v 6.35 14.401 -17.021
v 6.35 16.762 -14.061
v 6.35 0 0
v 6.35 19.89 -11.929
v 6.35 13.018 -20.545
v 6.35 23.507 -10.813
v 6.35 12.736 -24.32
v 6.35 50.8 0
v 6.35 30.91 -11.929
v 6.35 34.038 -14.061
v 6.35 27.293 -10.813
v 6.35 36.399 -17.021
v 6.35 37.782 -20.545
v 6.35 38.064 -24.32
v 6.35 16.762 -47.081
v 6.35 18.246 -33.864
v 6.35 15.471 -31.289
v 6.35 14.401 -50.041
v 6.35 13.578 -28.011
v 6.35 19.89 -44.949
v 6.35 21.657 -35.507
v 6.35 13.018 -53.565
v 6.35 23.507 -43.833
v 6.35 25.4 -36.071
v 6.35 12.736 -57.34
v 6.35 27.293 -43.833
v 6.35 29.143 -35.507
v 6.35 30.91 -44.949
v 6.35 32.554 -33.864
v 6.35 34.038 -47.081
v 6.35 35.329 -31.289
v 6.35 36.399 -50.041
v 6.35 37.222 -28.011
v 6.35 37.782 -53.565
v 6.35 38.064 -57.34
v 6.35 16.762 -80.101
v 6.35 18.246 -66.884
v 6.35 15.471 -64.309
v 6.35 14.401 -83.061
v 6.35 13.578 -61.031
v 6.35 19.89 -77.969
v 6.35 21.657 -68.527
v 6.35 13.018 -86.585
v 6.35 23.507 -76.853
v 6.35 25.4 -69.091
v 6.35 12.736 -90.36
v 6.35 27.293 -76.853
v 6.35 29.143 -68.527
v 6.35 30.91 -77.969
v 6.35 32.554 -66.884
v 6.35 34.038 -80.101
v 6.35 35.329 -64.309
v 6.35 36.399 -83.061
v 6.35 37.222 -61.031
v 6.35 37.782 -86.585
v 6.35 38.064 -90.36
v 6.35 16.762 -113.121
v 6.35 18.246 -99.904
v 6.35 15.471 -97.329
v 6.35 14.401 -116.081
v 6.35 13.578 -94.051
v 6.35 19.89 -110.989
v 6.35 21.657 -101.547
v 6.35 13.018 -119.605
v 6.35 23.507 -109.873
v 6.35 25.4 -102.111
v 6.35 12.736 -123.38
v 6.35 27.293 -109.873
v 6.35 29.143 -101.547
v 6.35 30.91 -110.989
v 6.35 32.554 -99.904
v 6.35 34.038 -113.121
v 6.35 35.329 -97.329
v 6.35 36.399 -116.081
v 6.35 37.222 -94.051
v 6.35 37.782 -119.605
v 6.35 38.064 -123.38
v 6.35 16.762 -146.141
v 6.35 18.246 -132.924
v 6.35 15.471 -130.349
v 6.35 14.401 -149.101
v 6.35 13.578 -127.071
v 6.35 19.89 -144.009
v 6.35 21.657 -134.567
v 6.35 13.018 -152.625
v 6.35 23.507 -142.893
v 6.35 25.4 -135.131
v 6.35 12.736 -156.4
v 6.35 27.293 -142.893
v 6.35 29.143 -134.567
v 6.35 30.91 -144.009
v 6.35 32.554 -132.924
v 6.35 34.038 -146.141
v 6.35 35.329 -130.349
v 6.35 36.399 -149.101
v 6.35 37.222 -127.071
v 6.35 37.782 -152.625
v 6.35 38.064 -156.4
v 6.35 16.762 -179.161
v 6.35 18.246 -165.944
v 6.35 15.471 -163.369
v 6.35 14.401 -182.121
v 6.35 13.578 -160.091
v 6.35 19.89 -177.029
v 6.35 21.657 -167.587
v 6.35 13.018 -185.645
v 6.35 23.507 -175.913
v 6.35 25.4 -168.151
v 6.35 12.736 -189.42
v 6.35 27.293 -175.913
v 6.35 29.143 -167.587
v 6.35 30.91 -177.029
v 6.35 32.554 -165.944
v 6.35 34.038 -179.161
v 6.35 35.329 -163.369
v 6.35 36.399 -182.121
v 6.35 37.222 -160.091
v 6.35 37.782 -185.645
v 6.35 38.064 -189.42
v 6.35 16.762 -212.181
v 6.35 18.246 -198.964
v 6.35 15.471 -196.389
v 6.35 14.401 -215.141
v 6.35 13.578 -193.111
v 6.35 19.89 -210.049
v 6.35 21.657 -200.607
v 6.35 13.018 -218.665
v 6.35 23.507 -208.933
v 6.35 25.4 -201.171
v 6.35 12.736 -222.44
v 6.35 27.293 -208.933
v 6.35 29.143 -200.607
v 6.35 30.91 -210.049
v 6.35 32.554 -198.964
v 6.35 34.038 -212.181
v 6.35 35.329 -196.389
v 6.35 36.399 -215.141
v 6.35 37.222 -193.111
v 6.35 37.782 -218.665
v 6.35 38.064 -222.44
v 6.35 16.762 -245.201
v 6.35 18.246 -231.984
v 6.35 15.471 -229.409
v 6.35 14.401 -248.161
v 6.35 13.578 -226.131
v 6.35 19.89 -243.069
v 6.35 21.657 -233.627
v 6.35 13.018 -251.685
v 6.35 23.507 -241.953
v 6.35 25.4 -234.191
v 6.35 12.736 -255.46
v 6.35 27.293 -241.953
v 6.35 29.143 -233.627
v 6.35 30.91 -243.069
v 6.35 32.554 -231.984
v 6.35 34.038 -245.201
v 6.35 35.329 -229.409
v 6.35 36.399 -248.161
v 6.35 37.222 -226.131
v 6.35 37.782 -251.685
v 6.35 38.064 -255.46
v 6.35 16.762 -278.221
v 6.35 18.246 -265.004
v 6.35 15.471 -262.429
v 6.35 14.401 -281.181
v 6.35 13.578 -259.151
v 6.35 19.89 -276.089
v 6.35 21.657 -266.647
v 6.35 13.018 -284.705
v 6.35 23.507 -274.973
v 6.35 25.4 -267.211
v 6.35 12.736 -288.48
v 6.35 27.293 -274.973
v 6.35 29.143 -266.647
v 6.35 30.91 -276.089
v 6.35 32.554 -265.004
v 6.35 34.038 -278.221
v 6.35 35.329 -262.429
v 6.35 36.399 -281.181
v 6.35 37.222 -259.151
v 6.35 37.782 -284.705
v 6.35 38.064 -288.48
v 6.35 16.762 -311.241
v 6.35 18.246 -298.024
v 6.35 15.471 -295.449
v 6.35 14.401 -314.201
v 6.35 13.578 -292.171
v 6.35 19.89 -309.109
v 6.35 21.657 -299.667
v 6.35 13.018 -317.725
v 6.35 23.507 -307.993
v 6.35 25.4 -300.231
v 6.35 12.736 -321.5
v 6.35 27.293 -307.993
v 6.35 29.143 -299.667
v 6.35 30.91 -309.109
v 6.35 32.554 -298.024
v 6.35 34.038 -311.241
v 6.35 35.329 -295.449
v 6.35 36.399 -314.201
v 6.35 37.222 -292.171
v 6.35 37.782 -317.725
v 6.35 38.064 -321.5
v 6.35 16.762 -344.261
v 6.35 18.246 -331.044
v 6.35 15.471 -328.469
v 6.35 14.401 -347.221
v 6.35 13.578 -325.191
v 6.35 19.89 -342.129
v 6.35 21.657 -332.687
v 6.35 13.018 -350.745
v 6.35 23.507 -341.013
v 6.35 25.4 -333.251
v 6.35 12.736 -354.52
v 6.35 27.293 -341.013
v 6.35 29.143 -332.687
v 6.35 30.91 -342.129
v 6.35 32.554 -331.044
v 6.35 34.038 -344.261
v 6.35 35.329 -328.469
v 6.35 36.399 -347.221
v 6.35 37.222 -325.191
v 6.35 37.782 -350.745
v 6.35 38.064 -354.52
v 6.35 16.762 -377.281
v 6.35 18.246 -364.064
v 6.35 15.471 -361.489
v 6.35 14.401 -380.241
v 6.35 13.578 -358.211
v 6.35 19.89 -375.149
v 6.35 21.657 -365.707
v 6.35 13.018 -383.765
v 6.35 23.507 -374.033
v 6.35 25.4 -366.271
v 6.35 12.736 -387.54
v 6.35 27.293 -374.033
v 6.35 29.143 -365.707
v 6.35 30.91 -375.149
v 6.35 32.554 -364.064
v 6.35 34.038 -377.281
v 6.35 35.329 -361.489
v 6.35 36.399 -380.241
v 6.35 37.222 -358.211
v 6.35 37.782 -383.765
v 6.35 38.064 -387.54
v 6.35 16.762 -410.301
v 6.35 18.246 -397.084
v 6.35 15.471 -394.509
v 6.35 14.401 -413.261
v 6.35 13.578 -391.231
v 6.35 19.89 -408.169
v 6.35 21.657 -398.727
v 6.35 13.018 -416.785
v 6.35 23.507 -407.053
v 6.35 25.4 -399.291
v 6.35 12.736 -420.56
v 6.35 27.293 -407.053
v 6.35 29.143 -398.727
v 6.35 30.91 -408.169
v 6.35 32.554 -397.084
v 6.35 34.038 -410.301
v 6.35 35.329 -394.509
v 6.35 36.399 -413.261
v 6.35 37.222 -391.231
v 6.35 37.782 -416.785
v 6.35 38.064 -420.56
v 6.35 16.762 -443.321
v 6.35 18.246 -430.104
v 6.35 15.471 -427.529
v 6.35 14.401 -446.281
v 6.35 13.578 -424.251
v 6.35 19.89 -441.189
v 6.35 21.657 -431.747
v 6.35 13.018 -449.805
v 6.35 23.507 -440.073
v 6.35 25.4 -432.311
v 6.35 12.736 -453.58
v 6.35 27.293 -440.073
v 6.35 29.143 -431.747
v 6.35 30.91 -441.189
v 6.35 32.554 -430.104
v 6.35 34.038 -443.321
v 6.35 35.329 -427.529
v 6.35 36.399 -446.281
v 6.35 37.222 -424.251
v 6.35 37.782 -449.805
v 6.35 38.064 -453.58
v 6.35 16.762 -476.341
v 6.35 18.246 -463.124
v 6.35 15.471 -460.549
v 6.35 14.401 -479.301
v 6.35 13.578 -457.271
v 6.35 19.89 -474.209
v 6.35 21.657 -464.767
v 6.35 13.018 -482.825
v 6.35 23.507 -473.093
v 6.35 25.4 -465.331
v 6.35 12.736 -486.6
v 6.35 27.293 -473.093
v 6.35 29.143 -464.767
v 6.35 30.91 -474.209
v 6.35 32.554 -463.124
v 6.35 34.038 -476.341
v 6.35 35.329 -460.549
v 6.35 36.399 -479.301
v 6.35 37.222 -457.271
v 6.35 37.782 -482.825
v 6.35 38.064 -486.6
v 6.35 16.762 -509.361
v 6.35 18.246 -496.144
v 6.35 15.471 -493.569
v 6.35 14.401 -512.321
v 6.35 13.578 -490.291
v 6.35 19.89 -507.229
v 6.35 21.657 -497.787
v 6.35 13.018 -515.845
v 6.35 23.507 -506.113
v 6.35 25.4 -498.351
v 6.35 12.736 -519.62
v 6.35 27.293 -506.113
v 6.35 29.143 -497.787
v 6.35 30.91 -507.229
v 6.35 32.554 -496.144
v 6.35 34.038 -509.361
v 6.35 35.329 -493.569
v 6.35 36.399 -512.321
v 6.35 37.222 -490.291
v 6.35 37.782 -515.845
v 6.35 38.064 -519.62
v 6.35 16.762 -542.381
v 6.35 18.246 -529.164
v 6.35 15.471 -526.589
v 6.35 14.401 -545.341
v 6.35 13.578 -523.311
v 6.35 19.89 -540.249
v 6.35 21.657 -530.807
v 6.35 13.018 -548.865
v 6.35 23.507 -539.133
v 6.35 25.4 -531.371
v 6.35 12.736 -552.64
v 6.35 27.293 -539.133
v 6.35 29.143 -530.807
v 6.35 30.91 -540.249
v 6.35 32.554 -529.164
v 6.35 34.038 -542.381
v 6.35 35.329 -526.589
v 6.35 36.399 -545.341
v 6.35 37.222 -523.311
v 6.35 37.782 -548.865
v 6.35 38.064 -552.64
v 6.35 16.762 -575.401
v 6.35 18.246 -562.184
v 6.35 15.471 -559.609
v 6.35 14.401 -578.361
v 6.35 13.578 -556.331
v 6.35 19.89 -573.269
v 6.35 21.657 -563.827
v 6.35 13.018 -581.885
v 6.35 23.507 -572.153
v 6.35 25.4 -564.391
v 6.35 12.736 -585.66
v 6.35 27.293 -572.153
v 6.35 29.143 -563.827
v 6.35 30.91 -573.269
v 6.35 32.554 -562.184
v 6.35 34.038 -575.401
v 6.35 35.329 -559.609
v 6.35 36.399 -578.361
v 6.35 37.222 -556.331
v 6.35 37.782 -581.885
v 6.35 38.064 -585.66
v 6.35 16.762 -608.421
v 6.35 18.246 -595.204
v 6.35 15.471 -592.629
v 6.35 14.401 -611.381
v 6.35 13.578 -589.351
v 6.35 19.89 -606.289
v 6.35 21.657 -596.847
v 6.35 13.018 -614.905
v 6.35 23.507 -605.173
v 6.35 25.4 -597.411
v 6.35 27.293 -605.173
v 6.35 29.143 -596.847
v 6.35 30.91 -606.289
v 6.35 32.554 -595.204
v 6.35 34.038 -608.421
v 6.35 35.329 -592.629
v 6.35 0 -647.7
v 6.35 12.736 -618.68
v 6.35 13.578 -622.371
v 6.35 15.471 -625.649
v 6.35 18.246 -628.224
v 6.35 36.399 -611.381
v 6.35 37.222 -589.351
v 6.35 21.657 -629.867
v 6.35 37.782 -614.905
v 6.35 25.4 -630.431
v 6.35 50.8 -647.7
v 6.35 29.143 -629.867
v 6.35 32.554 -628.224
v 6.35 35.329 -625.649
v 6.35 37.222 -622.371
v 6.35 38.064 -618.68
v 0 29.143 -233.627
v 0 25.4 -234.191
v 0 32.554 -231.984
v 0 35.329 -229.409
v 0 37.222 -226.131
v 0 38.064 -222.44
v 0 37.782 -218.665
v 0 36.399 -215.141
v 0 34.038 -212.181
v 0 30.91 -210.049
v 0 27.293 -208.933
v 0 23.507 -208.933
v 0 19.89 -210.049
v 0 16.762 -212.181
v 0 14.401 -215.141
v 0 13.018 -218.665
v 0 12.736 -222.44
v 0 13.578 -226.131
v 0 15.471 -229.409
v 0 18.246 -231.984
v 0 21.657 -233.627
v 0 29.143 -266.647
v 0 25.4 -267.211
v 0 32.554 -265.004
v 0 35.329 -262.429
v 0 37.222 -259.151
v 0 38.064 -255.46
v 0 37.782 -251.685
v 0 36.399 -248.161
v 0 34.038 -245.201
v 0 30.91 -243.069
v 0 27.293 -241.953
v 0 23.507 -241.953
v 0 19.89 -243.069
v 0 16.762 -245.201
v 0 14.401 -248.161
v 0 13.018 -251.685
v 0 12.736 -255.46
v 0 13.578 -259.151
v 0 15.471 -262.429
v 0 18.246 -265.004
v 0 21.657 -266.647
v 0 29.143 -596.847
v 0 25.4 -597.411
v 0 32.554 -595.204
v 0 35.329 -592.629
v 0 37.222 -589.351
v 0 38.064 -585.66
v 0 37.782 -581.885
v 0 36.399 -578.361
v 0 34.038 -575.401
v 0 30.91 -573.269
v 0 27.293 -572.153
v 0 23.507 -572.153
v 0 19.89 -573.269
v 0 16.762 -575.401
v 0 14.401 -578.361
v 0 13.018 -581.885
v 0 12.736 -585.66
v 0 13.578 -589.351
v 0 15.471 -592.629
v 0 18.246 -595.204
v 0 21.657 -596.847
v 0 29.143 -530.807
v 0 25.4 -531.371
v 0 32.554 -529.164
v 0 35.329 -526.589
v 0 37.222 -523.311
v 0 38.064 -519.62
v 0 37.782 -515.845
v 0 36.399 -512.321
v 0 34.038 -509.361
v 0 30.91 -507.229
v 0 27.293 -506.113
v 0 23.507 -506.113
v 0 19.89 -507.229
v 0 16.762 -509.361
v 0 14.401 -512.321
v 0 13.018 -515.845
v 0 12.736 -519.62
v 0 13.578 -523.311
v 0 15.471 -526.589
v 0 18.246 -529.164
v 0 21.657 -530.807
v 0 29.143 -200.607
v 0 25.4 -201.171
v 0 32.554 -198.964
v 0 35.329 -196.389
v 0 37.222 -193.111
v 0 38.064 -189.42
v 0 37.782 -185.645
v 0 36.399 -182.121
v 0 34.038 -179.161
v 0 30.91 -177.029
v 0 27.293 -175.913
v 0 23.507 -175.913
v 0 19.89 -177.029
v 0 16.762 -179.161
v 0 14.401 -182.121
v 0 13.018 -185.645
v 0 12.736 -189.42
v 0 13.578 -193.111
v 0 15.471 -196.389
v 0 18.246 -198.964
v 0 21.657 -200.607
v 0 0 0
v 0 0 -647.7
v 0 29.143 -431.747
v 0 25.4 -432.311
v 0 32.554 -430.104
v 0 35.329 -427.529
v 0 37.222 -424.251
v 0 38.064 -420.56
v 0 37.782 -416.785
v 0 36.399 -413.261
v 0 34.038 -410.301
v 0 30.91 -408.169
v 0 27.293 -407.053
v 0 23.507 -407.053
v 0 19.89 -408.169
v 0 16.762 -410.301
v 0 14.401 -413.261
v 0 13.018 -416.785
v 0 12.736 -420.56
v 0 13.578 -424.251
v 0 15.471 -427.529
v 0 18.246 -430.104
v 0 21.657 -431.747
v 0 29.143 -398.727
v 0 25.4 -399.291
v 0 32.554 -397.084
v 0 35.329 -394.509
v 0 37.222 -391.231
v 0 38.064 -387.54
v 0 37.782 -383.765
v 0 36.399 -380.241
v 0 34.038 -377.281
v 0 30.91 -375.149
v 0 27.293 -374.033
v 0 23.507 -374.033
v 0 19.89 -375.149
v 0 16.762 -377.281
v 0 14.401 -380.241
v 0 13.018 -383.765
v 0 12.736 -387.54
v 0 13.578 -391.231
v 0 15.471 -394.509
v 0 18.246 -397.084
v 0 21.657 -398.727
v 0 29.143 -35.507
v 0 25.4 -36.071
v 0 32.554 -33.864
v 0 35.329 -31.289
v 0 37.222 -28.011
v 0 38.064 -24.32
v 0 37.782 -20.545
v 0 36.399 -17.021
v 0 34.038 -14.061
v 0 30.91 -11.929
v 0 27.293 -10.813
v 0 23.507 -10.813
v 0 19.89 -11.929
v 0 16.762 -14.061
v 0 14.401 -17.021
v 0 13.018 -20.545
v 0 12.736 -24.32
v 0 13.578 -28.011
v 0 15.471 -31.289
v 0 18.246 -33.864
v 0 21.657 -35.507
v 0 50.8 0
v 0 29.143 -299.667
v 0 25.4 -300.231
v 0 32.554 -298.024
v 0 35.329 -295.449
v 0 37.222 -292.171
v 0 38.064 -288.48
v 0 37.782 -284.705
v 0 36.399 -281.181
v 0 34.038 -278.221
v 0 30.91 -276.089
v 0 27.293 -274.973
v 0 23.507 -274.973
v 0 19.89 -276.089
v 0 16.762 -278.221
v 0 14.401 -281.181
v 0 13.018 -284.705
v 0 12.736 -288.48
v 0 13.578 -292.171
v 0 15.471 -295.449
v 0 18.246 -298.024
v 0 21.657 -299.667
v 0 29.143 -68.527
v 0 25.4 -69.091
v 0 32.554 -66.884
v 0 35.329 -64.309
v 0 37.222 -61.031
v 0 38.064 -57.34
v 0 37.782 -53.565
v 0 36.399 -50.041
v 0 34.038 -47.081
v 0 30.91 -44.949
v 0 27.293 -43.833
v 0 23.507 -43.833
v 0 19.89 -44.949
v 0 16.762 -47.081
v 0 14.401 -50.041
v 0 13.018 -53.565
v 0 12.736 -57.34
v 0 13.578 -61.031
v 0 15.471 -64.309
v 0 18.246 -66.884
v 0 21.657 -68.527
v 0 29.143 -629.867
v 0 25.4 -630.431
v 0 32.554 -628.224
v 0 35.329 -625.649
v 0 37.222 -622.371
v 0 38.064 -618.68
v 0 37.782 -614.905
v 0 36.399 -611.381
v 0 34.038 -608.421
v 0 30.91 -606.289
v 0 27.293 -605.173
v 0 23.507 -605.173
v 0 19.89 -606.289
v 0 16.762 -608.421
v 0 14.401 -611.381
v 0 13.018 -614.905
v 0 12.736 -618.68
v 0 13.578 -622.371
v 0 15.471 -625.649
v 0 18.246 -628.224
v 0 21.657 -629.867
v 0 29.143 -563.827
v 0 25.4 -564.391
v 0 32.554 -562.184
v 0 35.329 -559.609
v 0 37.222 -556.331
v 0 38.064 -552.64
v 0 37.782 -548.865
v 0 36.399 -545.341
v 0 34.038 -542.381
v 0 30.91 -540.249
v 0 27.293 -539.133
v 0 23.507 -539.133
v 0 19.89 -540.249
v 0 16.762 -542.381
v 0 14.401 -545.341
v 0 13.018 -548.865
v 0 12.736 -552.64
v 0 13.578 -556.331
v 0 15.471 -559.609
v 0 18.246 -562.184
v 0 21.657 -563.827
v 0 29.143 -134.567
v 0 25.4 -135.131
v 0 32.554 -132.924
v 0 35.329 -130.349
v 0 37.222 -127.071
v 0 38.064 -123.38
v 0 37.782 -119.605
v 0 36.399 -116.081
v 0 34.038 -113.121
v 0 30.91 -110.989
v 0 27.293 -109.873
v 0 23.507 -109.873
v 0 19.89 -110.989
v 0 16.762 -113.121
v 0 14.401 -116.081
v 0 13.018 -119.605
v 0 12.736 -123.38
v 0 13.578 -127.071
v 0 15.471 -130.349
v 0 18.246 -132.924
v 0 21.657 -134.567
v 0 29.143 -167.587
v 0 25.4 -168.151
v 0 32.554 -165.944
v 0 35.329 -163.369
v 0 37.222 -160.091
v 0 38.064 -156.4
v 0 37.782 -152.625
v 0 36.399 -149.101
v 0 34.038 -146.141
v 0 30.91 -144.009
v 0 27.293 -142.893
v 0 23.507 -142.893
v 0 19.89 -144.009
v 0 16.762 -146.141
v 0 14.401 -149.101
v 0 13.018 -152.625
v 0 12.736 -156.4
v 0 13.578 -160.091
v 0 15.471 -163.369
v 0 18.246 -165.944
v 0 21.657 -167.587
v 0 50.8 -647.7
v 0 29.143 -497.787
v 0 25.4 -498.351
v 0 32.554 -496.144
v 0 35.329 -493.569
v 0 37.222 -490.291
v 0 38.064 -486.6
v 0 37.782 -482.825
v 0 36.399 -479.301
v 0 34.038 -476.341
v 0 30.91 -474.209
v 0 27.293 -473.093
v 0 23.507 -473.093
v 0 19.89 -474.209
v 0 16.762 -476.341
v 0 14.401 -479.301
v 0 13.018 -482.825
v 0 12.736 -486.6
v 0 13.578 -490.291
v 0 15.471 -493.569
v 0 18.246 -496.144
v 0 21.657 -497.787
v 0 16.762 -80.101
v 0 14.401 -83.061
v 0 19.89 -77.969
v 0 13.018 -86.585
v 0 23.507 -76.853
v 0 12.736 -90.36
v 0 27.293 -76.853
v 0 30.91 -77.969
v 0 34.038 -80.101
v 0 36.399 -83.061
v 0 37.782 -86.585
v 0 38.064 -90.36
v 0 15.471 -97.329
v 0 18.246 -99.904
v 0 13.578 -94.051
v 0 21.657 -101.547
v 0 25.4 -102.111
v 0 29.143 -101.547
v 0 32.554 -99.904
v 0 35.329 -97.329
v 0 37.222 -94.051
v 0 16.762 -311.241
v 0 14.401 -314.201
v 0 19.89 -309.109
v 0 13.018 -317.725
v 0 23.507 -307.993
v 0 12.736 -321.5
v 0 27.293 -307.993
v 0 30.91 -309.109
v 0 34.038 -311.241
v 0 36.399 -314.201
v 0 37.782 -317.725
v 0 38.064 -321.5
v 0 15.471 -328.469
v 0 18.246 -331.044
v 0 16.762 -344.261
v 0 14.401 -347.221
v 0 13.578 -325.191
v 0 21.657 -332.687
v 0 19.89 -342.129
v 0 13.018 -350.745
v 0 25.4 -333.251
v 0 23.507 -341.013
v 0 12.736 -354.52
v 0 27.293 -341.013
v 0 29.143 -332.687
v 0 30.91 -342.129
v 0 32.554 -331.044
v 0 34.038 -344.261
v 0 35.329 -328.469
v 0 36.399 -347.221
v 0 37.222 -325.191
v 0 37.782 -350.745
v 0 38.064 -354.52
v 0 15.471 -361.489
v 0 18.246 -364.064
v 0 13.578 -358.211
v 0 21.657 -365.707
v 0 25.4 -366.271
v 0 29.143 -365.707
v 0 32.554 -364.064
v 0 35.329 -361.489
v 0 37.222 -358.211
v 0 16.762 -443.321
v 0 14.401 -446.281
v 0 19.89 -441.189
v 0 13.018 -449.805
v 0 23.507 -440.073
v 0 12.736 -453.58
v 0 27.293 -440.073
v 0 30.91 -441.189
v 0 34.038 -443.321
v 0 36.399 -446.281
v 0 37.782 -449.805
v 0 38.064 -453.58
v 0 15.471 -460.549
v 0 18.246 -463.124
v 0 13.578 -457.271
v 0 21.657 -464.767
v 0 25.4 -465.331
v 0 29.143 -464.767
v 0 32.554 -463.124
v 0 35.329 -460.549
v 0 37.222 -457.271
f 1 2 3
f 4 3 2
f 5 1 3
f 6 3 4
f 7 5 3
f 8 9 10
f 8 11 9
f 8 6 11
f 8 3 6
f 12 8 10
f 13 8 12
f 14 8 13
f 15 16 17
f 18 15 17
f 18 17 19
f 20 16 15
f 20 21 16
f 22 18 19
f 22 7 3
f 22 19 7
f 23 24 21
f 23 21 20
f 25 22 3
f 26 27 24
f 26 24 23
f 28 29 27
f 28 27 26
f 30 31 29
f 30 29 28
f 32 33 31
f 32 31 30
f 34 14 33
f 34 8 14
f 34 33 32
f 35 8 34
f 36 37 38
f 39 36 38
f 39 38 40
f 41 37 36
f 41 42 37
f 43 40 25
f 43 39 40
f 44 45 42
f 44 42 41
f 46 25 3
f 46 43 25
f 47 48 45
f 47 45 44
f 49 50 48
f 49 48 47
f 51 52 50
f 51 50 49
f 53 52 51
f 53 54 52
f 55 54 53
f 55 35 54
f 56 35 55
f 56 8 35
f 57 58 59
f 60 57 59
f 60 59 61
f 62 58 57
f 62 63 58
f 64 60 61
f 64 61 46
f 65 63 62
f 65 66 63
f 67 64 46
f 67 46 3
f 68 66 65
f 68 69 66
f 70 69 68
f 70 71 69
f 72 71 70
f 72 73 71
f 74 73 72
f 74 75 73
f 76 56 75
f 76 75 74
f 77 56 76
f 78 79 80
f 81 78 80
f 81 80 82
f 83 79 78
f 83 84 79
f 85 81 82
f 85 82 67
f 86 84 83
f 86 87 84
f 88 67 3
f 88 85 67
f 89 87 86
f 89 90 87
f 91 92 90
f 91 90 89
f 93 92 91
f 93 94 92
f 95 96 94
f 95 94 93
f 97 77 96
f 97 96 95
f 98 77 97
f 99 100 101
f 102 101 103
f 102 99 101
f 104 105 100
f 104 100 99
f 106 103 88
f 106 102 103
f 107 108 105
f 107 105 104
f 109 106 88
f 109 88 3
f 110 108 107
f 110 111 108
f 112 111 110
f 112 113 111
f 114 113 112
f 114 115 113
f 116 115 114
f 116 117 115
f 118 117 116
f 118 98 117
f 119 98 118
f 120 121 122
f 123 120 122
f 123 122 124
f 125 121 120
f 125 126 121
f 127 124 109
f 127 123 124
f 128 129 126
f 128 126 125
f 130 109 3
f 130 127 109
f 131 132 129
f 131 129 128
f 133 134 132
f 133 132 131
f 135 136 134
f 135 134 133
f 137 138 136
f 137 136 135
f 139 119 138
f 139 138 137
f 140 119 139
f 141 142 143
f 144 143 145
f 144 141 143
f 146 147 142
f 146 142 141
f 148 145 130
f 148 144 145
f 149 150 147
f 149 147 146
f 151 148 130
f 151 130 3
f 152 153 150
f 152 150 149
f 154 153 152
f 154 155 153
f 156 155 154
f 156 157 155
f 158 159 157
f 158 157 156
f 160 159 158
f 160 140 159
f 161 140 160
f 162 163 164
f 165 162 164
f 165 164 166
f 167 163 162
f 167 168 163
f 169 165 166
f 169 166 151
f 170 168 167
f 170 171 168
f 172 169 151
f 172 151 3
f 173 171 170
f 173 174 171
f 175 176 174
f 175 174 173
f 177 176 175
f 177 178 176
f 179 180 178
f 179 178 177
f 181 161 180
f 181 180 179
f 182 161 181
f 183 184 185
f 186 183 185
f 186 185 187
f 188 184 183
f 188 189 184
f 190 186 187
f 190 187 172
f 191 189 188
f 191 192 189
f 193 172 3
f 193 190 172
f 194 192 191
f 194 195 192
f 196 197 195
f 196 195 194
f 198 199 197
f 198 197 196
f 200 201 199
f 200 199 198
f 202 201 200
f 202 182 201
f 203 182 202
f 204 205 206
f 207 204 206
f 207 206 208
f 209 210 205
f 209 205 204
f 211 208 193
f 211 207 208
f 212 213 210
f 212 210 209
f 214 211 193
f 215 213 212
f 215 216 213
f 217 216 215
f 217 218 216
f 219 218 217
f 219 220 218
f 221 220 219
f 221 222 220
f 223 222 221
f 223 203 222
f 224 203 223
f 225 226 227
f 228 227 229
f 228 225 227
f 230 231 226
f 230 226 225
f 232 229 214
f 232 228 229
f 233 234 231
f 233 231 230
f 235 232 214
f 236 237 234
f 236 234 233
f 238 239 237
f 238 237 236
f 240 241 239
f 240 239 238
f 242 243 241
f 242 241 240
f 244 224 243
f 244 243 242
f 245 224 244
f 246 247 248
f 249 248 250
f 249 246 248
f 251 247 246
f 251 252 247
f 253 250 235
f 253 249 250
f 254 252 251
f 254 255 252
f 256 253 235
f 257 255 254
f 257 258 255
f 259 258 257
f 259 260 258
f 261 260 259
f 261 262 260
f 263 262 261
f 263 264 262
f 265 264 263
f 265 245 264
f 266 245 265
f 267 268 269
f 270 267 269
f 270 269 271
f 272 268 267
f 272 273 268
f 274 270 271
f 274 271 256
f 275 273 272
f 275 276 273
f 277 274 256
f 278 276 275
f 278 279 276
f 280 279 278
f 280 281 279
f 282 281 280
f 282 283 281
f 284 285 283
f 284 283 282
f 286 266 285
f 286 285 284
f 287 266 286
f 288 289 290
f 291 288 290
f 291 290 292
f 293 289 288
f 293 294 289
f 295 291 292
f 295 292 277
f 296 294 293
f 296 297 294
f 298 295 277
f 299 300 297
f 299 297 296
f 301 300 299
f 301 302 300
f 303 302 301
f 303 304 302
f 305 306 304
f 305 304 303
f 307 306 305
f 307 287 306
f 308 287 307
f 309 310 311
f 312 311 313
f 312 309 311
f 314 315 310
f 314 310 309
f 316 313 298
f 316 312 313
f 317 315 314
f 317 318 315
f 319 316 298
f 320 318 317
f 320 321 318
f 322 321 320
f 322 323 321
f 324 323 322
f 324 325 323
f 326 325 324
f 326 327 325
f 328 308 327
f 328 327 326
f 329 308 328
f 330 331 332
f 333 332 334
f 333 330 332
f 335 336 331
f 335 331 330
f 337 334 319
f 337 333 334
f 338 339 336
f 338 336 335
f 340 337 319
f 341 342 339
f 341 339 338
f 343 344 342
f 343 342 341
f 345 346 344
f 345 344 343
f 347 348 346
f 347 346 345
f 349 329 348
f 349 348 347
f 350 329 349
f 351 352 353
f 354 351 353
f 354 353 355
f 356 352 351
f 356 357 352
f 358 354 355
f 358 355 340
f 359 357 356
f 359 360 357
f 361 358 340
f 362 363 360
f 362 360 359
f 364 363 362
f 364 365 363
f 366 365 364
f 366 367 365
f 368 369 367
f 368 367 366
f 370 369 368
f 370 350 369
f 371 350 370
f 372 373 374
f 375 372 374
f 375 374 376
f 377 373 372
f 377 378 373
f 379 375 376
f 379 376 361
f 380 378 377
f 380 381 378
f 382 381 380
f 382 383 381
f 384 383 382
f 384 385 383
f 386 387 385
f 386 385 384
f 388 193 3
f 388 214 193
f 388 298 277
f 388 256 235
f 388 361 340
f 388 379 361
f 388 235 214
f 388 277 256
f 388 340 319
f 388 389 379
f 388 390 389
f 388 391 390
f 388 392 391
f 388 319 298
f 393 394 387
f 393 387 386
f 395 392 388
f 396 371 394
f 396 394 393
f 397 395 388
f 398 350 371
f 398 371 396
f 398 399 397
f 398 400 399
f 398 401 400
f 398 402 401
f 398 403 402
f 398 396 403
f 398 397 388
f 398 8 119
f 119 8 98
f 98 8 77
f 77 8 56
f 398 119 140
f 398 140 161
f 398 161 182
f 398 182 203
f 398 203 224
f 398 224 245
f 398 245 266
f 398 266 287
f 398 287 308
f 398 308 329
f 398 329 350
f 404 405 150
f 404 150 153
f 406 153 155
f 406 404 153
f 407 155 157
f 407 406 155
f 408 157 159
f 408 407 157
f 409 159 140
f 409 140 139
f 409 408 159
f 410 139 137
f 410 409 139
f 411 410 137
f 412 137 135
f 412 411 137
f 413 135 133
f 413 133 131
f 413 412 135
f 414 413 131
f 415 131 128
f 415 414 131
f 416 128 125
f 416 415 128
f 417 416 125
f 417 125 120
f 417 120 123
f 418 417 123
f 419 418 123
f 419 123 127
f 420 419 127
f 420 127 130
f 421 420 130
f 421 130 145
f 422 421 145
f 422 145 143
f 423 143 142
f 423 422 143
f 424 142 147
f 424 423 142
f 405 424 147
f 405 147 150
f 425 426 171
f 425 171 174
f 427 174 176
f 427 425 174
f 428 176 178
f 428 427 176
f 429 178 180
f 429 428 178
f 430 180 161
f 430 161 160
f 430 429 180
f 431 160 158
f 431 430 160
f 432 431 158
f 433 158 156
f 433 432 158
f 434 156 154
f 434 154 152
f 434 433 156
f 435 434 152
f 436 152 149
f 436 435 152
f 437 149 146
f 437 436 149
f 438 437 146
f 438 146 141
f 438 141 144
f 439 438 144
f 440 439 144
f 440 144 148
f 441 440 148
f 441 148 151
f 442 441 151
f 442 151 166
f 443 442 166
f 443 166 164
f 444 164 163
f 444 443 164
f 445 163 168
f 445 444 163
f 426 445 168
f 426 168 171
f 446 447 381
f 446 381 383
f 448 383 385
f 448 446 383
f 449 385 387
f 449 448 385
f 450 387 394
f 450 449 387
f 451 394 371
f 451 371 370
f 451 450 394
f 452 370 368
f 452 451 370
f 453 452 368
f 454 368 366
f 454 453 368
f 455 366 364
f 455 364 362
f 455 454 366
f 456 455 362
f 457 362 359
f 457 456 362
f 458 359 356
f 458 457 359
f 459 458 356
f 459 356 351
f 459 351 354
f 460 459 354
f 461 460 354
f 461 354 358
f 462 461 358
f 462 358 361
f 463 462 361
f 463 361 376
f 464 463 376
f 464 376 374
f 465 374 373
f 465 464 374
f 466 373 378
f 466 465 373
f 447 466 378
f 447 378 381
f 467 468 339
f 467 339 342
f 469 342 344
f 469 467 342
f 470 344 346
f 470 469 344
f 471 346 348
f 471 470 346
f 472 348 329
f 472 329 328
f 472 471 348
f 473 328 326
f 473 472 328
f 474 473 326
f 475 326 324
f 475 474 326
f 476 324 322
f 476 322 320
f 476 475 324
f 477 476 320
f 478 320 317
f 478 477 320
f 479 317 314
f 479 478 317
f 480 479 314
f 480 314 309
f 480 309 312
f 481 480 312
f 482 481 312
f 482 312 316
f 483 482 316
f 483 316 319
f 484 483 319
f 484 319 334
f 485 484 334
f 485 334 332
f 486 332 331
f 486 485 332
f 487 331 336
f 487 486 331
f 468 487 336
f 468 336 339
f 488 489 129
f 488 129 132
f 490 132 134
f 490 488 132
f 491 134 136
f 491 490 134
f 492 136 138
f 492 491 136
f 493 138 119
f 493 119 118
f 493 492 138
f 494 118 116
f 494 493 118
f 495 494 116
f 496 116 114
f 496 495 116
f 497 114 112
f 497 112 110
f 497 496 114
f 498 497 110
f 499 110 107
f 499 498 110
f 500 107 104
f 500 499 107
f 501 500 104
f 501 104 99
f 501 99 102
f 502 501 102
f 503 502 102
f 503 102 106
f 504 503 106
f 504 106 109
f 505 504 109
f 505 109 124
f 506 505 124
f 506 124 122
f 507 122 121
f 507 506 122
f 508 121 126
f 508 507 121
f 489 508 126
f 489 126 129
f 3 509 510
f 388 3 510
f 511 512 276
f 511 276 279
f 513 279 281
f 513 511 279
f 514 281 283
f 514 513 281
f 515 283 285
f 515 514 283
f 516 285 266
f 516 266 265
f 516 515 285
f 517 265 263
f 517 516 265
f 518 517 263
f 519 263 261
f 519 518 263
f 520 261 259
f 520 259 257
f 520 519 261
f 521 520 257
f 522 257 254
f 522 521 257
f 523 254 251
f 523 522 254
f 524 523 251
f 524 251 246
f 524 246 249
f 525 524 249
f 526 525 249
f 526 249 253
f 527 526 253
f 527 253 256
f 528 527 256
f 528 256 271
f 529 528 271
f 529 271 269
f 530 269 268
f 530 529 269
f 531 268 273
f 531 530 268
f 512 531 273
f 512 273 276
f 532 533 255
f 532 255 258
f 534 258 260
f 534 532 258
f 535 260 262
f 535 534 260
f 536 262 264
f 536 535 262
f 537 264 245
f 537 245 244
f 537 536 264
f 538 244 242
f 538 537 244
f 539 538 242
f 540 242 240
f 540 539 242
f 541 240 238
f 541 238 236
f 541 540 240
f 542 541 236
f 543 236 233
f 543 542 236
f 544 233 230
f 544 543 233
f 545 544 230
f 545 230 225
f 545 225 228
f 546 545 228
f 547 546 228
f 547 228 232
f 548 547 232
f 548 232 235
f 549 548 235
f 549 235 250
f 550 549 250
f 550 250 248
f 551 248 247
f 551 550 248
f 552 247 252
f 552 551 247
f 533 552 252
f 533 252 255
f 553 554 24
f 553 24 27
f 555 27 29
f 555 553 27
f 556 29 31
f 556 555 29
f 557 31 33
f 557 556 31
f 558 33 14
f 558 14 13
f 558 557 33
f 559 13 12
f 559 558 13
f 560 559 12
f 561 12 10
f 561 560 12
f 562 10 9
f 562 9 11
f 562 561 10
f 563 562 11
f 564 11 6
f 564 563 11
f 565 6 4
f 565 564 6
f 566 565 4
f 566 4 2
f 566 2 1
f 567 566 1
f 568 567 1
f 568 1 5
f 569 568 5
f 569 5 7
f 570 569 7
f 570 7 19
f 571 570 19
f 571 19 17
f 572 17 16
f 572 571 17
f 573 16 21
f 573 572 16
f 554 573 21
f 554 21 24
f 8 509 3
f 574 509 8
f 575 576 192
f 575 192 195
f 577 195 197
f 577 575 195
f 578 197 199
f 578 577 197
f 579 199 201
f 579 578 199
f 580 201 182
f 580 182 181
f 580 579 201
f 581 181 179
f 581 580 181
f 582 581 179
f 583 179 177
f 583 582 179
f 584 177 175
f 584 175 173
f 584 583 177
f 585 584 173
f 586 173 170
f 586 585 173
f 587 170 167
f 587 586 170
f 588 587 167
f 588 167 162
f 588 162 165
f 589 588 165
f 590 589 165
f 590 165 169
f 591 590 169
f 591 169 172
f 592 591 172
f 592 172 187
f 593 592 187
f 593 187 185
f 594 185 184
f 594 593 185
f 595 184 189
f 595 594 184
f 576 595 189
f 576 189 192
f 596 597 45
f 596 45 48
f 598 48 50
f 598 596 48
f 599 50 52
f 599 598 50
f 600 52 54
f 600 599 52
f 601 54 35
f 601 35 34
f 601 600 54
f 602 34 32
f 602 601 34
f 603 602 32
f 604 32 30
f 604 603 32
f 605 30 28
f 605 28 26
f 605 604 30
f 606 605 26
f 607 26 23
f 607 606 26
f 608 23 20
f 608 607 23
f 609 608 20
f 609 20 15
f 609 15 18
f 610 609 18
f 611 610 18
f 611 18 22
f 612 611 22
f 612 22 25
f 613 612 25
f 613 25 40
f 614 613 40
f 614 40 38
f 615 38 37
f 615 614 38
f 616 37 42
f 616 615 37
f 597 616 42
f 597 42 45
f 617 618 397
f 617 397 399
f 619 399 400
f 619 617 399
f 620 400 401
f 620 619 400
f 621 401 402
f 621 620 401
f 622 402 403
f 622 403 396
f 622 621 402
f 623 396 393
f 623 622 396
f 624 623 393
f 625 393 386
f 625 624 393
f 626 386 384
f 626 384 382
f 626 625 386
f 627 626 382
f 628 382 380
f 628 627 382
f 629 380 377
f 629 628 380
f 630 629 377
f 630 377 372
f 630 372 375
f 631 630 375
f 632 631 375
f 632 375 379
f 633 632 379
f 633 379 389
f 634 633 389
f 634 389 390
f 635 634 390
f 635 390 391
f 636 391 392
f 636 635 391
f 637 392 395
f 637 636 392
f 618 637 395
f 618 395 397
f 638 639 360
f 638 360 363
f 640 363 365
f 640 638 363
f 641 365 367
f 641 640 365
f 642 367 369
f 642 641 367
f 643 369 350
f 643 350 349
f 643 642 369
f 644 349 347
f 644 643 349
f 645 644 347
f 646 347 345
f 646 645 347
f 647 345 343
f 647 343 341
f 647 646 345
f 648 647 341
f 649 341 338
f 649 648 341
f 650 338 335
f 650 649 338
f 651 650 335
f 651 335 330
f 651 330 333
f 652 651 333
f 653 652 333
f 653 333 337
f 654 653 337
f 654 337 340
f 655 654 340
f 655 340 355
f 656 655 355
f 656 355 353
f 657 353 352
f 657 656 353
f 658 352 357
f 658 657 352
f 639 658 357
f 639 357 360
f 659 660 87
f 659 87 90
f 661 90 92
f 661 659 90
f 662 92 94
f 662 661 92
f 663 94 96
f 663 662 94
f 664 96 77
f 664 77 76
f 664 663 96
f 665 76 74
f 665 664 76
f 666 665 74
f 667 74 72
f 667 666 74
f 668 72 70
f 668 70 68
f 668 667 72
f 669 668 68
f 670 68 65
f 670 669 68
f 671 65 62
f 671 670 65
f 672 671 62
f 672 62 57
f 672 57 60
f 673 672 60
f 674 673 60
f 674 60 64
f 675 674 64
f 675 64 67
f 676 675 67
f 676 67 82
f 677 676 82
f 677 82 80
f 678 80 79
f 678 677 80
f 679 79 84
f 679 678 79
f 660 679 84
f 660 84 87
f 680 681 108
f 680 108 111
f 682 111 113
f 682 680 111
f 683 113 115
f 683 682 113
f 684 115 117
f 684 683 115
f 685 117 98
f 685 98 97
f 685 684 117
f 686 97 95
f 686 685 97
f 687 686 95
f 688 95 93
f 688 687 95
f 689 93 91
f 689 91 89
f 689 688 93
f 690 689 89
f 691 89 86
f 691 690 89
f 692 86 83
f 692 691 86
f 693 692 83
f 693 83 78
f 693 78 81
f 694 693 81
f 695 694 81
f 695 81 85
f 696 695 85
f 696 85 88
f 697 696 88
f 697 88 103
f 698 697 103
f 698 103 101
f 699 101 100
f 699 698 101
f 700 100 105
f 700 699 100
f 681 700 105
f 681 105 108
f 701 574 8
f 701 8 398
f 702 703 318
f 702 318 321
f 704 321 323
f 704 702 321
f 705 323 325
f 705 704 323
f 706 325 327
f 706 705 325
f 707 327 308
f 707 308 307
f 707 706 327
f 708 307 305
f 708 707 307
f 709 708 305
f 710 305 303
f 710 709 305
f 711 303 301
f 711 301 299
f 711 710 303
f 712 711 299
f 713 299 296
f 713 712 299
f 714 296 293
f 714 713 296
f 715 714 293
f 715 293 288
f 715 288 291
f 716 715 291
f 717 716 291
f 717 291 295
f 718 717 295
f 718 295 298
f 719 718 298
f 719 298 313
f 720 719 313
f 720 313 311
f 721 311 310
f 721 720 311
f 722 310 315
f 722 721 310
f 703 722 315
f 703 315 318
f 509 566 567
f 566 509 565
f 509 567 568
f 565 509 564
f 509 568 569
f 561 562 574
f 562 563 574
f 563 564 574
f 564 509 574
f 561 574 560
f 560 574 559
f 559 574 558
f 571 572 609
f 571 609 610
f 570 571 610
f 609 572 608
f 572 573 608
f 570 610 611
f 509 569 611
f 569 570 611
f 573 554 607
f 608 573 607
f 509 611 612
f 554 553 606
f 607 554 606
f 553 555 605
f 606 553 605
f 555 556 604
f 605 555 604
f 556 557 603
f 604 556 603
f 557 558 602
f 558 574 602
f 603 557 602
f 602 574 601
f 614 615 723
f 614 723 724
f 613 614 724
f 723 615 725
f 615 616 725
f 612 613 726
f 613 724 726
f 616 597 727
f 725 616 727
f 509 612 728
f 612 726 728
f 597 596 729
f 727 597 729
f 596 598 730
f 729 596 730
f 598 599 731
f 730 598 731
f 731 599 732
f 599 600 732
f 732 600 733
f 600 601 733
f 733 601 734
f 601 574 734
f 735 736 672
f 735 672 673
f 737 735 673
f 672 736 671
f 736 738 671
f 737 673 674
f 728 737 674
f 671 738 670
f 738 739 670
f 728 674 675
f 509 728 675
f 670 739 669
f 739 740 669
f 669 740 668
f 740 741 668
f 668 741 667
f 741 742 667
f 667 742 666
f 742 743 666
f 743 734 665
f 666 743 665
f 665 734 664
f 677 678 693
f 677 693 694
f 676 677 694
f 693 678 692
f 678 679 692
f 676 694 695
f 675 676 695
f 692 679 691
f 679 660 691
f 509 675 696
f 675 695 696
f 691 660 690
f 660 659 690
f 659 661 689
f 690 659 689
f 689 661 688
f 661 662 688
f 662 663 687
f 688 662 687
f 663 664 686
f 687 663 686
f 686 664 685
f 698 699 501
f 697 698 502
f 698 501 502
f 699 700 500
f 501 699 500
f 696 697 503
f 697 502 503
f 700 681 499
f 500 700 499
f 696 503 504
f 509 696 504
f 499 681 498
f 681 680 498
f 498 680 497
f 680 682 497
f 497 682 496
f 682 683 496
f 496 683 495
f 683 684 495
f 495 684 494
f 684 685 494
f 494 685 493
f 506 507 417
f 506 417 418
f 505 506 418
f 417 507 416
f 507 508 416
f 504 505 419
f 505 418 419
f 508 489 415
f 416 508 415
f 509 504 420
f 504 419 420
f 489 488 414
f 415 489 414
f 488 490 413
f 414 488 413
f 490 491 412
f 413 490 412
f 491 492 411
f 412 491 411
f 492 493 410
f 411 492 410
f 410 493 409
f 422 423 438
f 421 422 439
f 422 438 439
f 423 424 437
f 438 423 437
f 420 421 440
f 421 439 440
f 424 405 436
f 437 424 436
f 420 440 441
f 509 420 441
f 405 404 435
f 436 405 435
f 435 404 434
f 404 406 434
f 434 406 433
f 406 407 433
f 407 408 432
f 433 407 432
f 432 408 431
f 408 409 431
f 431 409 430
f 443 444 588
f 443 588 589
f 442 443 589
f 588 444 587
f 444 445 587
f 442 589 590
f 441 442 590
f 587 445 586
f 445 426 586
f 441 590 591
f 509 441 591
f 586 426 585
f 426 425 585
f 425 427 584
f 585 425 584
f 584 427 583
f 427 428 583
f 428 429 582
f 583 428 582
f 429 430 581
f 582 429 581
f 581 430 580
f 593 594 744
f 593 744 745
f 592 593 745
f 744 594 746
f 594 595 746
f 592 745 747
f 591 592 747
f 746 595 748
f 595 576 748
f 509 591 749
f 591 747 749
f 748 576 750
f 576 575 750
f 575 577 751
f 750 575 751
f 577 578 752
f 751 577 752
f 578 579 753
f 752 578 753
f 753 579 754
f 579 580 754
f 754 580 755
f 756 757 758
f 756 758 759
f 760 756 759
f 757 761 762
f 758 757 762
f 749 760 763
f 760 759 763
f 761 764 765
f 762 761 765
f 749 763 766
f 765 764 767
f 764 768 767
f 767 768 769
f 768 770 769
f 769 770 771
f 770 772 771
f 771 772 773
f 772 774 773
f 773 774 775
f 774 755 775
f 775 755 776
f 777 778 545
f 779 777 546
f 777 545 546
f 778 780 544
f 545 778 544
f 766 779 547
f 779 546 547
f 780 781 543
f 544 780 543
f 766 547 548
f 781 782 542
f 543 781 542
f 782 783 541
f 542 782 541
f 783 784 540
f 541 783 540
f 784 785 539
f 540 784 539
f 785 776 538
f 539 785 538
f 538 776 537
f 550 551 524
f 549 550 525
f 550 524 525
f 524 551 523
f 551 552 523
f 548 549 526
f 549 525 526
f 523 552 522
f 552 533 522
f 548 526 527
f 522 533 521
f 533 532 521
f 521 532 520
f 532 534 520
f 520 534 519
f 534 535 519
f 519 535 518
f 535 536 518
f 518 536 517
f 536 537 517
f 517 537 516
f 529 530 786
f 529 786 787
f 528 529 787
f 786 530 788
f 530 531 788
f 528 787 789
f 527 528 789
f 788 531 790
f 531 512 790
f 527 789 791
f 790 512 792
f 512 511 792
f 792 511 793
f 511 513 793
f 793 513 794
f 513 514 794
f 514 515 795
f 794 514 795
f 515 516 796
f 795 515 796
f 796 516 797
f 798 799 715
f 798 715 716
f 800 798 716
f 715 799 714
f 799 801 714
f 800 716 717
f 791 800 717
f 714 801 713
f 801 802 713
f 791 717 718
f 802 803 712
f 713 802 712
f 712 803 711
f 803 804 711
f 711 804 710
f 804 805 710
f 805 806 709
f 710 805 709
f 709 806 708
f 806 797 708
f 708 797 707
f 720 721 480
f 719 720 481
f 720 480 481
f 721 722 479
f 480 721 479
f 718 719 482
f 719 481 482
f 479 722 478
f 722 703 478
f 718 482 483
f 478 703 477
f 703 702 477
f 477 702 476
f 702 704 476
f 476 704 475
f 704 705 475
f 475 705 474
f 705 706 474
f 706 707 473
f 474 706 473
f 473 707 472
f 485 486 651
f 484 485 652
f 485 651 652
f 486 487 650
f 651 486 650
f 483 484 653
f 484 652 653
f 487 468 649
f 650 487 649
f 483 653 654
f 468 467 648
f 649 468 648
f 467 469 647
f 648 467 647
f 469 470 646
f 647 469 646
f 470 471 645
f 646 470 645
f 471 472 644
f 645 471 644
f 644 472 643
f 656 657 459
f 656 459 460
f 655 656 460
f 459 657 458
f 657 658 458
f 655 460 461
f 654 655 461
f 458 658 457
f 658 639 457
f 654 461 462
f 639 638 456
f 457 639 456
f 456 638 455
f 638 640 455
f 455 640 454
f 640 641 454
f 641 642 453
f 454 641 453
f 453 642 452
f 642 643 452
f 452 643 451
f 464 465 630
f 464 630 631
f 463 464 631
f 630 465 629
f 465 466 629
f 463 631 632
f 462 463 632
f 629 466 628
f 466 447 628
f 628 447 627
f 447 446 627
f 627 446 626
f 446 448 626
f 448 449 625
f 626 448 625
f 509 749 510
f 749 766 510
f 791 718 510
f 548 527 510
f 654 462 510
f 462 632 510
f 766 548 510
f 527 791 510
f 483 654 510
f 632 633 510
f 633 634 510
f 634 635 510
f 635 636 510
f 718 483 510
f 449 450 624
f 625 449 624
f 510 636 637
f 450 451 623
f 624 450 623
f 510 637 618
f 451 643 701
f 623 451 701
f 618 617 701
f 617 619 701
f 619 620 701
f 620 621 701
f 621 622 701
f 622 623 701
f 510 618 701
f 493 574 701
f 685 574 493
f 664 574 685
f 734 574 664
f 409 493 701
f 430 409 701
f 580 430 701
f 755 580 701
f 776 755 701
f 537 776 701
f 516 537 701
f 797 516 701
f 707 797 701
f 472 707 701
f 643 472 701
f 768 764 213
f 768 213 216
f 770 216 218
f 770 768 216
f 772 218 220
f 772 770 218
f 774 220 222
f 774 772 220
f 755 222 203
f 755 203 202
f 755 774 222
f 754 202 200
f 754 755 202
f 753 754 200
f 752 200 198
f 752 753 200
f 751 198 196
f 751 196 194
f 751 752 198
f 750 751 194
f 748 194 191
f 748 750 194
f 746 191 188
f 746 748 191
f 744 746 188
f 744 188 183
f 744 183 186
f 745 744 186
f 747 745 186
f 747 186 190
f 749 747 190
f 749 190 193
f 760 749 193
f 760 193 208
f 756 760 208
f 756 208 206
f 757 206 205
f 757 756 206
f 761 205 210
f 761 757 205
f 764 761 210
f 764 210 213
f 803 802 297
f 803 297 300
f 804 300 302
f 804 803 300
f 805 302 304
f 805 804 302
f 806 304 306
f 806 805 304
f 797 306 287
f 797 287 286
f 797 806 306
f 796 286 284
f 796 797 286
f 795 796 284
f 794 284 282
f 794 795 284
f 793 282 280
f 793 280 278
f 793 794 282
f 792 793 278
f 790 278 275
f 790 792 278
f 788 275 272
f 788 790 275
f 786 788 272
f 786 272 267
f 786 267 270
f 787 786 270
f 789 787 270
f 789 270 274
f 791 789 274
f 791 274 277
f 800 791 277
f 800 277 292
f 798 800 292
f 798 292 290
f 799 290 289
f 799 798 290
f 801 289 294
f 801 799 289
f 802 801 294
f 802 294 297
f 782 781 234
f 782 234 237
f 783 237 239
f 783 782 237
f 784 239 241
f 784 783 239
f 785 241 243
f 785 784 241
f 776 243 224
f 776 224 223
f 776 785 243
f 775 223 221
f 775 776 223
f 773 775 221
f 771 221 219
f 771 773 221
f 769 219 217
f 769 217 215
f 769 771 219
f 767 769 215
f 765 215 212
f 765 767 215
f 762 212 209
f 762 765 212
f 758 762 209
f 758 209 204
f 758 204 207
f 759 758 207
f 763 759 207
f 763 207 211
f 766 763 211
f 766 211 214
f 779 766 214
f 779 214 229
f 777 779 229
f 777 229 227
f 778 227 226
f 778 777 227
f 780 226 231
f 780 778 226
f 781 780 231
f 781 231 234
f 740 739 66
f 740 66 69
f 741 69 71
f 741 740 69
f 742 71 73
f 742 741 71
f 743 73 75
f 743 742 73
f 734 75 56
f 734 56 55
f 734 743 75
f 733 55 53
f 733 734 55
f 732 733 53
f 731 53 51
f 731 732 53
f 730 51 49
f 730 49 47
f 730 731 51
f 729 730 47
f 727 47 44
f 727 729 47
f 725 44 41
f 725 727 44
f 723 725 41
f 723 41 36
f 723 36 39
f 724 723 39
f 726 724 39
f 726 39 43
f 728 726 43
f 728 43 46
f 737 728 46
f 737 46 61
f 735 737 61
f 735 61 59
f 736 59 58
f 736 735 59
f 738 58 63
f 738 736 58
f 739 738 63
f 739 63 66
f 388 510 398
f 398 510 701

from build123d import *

# Parameters (mm, degrees)
SKETCH1_W           = 647.7
SKETCH1_H           = 50.8
SKETCH1_R           = 12.7
BOSS_EXTRUDE1_DEPTH = 6.35


with BuildPart() as part:
    # Sketch1 → Boss-Extrude1 (new body)
    with BuildSketch(Plane(origin=(0, 0, 0), x_dir=(0, 0, -1), z_dir=(1, 0, 0))):
        with Locations((323.85, 25.4)):
            Rectangle(SKETCH1_W, SKETCH1_H)
        with Locations((23.370832151, 25.4)):
            Circle(SKETCH1_R, mode=Mode.SUBTRACT)
        with Locations((56.390832151, 25.4)):
            Circle(SKETCH1_R, mode=Mode.SUBTRACT)
        with Locations((89.410832151, 25.4)):
            Circle(SKETCH1_R, mode=Mode.SUBTRACT)
        with Locations((122.430832151, 25.4)):
            Circle(SKETCH1_R, mode=Mode.SUBTRACT)
        with Locations((155.450832151, 25.4)):
            Circle(SKETCH1_R, mode=Mode.SUBTRACT)
        with Locations((188.470832151, 25.4)):
            Circle(SKETCH1_R, mode=Mode.SUBTRACT)
        with Locations((221.490832151, 25.4)):
            Circle(SKETCH1_R, mode=Mode.SUBTRACT)
        with Locations((254.510832151, 25.4)):
            Circle(SKETCH1_R, mode=Mode.SUBTRACT)
        with Locations((287.530832151, 25.4)):
            Circle(SKETCH1_R, mode=Mode.SUBTRACT)
        with Locations((320.550832151, 25.4)):
            Circle(SKETCH1_R, mode=Mode.SUBTRACT)
        with Locations((353.570832151, 25.4)):
            Circle(SKETCH1_R, mode=Mode.SUBTRACT)
        with Locations((386.590832151, 25.4)):
            Circle(SKETCH1_R, mode=Mode.SUBTRACT)
        with Locations((419.610832151, 25.4)):
            Circle(SKETCH1_R, mode=Mode.SUBTRACT)
        with Locations((452.630832151, 25.4)):
            Circle(SKETCH1_R, mode=Mode.SUBTRACT)
        with Locations((485.650832151, 25.4)):
            Circle(SKETCH1_R, mode=Mode.SUBTRACT)
        with Locations((518.670832151, 25.4)):
            Circle(SKETCH1_R, mode=Mode.SUBTRACT)
        with Locations((551.690832151, 25.4)):
            Circle(SKETCH1_R, mode=Mode.SUBTRACT)
        with Locations((584.710832151, 25.4)):
            Circle(SKETCH1_R, mode=Mode.SUBTRACT)
        with Locations((617.730832151, 25.4)):
            Circle(SKETCH1_R, mode=Mode.SUBTRACT)
    extrude(amount=BOSS_EXTRUDE1_DEPTH)


solid = part.part
